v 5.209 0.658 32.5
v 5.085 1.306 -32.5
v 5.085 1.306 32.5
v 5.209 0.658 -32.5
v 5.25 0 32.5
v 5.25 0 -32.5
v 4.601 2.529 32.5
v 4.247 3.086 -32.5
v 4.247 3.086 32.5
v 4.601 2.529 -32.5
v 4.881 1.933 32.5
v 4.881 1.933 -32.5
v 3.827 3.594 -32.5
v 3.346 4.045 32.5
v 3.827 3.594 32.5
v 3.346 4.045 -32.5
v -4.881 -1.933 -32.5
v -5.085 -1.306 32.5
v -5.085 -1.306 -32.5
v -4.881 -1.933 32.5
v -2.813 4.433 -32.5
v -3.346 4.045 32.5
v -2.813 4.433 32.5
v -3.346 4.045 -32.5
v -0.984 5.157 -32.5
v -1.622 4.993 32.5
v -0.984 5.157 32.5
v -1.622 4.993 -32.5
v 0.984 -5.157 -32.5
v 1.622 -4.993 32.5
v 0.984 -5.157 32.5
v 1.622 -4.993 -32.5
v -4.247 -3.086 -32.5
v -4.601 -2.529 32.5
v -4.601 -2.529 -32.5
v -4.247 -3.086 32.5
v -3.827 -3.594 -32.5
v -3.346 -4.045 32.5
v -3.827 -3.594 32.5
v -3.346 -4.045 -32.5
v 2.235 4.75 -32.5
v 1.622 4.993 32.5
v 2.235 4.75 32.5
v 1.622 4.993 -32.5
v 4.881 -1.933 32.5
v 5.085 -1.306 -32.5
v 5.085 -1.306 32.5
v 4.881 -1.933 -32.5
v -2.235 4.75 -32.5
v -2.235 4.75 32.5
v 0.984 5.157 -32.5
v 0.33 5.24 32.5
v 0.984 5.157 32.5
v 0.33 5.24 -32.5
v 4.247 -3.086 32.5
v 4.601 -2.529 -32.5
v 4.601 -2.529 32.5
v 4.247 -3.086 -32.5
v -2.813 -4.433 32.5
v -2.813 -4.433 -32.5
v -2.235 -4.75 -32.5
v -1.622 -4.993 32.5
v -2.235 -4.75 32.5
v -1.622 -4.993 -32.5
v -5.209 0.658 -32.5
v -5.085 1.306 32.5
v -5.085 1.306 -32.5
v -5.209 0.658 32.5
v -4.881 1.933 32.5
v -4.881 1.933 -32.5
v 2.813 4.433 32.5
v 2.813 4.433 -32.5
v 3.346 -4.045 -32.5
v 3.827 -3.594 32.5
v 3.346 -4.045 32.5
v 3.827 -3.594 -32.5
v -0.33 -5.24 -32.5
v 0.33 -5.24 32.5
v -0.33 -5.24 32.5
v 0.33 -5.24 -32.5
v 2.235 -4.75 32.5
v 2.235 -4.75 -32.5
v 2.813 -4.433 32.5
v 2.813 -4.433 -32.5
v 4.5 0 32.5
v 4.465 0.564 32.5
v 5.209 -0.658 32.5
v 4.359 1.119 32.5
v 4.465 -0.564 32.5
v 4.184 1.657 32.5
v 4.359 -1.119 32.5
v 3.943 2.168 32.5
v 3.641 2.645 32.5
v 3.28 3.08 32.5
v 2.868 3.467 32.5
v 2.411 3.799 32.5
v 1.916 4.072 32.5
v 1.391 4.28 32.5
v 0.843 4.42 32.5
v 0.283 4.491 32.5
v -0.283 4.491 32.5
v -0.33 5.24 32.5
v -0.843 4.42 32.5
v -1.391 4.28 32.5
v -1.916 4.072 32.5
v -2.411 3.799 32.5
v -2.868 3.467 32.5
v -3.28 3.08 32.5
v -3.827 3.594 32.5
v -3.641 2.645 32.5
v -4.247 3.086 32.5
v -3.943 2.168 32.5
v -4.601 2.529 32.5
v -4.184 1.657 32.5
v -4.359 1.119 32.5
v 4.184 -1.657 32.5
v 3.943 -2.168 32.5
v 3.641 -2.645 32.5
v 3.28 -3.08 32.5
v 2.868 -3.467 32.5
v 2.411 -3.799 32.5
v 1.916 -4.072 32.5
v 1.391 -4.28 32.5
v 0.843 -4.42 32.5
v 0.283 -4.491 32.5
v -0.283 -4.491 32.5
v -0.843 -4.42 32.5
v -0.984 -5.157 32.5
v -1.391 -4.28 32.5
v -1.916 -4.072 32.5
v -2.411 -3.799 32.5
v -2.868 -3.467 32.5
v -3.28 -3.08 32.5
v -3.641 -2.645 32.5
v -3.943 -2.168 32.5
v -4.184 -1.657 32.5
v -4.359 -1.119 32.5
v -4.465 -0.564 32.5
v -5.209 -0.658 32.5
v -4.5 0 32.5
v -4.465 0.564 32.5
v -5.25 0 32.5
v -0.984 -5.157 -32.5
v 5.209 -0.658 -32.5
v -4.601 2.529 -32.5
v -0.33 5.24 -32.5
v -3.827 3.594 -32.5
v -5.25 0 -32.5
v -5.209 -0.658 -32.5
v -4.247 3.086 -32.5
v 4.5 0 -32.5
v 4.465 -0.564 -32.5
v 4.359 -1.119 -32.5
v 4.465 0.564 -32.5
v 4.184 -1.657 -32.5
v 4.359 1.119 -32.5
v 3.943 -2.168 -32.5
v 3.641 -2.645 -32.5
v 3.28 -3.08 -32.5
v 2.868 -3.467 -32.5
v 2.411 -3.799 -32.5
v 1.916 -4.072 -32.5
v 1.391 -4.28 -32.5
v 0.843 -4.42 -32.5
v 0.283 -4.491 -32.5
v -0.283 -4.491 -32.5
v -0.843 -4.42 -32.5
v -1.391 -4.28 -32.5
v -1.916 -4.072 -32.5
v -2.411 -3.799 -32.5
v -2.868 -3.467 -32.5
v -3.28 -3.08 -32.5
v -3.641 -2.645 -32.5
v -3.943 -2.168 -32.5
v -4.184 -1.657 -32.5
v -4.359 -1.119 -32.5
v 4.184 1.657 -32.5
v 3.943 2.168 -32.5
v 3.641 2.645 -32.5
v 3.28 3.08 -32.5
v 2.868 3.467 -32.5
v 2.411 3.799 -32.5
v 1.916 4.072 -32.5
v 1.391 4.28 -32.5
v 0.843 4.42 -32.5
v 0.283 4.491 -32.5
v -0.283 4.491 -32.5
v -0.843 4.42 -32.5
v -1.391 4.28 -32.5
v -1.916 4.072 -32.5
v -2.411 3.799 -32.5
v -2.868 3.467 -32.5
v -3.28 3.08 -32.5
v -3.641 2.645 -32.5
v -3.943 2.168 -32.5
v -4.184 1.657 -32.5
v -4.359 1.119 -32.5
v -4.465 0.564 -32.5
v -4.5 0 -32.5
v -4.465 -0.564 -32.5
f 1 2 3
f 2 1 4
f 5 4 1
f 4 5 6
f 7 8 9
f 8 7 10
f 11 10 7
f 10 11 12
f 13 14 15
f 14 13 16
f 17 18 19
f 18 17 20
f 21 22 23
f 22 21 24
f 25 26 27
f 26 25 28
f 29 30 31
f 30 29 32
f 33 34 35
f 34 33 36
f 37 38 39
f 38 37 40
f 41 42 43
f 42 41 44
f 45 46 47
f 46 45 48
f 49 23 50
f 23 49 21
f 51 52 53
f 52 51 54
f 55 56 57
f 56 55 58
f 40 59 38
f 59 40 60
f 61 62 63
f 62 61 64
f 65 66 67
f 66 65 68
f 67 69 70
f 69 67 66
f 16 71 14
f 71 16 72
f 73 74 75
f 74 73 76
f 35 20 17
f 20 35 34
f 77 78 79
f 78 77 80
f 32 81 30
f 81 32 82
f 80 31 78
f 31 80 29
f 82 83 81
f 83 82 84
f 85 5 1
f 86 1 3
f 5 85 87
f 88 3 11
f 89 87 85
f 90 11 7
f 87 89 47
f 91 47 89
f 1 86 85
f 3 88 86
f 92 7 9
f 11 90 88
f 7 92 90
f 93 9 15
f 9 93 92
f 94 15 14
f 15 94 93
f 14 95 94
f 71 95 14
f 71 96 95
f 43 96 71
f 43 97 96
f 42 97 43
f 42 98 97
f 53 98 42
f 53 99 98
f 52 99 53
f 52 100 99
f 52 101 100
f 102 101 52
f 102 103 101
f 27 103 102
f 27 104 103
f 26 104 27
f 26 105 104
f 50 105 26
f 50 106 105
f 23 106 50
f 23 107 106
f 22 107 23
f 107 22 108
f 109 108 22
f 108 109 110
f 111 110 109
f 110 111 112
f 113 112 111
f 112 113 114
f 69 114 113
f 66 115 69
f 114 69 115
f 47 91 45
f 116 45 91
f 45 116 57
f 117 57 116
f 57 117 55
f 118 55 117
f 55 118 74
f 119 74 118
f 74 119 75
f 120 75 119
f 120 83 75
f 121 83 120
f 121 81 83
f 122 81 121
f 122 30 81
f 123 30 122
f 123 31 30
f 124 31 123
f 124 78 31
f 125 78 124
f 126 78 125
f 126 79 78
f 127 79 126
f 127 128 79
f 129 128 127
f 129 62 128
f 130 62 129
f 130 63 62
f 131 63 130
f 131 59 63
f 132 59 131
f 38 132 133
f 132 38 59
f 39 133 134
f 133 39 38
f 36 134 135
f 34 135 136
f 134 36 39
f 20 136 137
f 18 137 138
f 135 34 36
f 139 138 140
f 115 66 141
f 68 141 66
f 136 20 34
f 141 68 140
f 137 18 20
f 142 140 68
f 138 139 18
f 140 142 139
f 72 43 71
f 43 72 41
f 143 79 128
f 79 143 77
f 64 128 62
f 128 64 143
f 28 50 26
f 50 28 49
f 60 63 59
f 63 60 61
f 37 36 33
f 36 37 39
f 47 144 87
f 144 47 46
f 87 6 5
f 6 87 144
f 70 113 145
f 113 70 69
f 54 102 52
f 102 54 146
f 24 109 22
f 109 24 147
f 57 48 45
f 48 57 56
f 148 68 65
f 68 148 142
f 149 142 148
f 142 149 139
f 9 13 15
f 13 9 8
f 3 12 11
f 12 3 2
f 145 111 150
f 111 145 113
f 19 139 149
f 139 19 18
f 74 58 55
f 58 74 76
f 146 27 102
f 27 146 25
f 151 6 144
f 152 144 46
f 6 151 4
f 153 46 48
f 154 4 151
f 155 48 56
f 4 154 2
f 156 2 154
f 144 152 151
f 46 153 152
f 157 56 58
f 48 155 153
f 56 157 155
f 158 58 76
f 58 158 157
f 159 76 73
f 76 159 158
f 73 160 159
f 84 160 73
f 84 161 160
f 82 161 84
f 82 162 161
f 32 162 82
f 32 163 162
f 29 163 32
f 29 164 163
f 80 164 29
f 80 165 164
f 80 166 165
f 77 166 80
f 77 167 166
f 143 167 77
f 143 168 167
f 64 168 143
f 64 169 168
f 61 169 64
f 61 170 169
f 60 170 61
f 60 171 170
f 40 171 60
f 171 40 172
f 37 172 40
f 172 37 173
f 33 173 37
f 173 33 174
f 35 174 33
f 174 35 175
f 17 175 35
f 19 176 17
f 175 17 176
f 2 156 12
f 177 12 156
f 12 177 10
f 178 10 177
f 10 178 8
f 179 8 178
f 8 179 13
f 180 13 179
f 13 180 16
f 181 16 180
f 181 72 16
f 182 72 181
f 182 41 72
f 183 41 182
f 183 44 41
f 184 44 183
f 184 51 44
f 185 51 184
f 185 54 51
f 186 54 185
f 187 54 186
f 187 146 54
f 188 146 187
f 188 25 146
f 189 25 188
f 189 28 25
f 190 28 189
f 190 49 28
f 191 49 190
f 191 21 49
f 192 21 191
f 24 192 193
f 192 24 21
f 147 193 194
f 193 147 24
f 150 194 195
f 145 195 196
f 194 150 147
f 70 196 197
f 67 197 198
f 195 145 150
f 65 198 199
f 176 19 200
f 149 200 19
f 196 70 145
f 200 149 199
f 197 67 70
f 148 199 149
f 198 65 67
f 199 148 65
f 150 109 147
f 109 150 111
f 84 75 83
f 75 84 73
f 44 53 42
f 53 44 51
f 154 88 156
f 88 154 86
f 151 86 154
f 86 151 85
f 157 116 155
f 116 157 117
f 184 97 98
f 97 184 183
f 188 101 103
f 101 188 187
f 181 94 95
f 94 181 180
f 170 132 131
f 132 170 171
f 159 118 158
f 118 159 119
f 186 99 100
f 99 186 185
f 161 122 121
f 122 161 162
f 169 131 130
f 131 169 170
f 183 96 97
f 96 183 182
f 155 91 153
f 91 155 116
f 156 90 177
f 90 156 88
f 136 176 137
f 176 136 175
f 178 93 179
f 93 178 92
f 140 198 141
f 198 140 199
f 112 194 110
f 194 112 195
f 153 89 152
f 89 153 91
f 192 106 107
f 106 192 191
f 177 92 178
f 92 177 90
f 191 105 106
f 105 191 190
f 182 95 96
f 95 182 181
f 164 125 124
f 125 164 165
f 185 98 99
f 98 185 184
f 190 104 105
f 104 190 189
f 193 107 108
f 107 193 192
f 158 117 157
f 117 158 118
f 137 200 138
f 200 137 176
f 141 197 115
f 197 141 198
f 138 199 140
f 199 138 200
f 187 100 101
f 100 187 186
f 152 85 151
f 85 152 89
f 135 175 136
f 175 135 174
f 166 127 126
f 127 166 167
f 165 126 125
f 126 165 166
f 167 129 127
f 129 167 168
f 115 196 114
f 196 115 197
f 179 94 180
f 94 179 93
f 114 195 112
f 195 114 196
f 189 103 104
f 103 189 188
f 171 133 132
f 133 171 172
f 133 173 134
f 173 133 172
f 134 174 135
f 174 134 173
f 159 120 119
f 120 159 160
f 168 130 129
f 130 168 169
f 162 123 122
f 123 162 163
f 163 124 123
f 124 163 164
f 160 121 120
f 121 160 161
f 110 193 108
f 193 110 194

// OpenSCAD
$fn = 50;


difference() {
	union() {
		translate(v = [0, 0, -32.5000000000]) {
			cylinder(h = 65, r = 5.2500000000);
		}
	}
	union() {
		translate(v = [0, 0, -100.0000000000]) {
			cylinder(h = 200, r = 4.5000000000);
		}
	}
}
